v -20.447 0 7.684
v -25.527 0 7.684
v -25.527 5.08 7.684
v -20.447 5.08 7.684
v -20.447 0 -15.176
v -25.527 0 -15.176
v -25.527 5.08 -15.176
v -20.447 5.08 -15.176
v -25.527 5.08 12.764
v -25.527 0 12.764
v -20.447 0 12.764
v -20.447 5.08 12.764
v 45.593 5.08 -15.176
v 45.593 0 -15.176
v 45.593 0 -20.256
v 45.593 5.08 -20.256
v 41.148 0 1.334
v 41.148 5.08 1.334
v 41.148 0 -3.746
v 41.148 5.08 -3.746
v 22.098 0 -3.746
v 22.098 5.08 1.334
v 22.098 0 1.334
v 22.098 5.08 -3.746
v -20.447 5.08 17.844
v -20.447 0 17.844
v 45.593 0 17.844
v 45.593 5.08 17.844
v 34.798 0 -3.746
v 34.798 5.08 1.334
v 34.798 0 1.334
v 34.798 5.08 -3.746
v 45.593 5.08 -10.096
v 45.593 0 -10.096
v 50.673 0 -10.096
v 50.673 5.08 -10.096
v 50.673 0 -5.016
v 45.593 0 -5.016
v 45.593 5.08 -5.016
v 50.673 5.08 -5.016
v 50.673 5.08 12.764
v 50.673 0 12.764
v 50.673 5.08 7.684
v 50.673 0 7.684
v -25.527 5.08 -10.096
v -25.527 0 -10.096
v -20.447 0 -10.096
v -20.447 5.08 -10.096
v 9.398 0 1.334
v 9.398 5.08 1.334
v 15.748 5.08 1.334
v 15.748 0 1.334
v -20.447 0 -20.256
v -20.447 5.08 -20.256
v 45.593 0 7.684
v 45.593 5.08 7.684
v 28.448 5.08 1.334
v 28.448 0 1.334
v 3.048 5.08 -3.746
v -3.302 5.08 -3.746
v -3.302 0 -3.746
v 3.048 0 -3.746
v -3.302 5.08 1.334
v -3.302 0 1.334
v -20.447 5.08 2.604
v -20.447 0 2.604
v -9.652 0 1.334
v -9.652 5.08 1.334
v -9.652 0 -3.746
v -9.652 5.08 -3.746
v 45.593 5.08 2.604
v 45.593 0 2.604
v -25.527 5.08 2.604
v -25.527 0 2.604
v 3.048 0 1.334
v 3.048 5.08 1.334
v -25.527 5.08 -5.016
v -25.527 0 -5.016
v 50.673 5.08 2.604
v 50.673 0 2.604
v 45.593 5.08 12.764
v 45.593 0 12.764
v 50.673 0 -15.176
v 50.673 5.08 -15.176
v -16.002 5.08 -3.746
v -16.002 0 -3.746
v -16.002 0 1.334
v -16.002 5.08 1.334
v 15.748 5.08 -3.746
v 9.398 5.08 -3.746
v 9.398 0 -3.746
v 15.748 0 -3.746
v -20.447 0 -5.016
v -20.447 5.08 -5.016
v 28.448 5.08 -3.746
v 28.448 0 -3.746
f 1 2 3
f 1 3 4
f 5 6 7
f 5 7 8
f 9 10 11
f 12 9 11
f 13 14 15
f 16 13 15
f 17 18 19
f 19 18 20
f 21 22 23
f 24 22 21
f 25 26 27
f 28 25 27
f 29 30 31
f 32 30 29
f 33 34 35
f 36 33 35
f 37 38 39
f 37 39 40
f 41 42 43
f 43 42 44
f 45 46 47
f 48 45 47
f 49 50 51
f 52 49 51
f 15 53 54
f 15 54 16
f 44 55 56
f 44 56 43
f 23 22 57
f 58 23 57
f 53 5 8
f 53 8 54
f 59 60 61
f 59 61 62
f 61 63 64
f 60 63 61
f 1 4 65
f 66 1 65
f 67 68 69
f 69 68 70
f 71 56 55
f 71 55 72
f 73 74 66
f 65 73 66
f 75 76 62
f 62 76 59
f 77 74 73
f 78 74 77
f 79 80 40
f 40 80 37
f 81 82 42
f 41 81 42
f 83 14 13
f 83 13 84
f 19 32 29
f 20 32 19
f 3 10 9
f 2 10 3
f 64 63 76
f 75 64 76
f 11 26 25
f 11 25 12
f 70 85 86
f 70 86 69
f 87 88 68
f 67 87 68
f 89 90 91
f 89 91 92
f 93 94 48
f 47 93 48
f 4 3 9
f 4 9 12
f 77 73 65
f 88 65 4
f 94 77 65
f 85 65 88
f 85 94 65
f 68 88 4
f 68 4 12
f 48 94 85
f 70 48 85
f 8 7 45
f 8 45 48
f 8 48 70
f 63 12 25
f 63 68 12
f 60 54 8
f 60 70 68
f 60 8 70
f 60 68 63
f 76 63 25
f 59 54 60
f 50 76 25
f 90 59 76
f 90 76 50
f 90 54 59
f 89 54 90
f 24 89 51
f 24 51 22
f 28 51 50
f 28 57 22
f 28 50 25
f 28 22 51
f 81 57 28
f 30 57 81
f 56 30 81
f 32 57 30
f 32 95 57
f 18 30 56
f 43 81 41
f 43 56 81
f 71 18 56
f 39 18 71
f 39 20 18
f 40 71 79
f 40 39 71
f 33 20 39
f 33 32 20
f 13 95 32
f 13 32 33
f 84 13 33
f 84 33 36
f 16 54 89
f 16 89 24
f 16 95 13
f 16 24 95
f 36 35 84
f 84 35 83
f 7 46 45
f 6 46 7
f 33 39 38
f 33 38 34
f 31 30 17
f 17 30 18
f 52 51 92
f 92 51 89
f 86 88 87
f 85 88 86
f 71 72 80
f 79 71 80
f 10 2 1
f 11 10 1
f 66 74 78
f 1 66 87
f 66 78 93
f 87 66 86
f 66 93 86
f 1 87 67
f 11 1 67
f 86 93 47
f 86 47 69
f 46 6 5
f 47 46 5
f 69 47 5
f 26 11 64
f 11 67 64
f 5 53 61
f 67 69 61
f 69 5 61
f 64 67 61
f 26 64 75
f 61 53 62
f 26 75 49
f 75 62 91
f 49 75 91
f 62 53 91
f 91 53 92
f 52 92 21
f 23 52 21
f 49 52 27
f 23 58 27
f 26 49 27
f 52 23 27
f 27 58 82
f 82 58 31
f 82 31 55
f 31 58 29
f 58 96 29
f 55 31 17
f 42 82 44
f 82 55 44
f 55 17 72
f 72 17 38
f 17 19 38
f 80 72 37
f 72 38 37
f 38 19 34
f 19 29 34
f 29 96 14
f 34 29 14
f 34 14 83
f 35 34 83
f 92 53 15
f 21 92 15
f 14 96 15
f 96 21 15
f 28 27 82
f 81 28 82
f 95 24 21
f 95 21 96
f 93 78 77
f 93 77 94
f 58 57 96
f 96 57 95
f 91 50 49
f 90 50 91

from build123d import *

# Parameters (mm, degrees)
SKETCH1_W           = 76.2
SKETCH1_H           = 38.1
BOSS_EXTRUDE1_DEPTH = 5.08
SKETCH2_W           = 5.08
SKETCH2_H           = 5.08
CUT_EXTRUDE1_DEPTH  = 5.08
SKETCH3_W           = 6.35
SKETCH3_H           = 5.08
CUT_EXTRUDE2_DEPTH  = 5.08


with BuildPart() as part:
    # Sketch1 → Boss-Extrude1 (new body)
    with BuildSketch(Plane(origin=(0, 0, 0), x_dir=(1, 0, 0), z_dir=(0, 1, 0))):
        with Locations((12.573, 1.2065)):
            Rectangle(SKETCH1_W, SKETCH1_H)
    extrude(amount=BOSS_EXTRUDE1_DEPTH)

    # Sketch2 → Cut-Extrude1 (cut)
    with BuildSketch(Plane(origin=(0, 5.08, 0), x_dir=(1, 0, 0), z_dir=(0, 1, 0))):
        with Locations((-22.987, -5.1435)):
            Rectangle(SKETCH2_W, SKETCH2_H)
        with Locations((48.133, 17.7165)):
            Rectangle(SKETCH2_W, SKETCH2_H)
        with Locations((48.133, 7.5565)):
            Rectangle(SKETCH2_W, SKETCH2_H)
        with Locations((48.133, -15.3035)):
            Rectangle(SKETCH2_W, SKETCH2_H)
        with Locations((48.133, -5.1435)):
            Rectangle(SKETCH2_W, SKETCH2_H)
        with Locations((-22.987, -15.3035)):
            Rectangle(SKETCH2_W, SKETCH2_H)
        with Locations((-22.987, 7.5565)):
            Rectangle(SKETCH2_W, SKETCH2_H)
        with Locations((-22.987, 17.7165)):
            Rectangle(SKETCH2_W, SKETCH2_H)
    extrude(amount=-CUT_EXTRUDE1_DEPTH, mode=Mode.SUBTRACT)

    # Sketch3 → Cut-Extrude2 (cut)
    with BuildSketch(Plane(origin=(0, 5.08, 0), x_dir=(1, 0, 0), z_dir=(0, 1, 0))):
        with Locations((-12.827, 1.2065)):
            Rectangle(SKETCH3_W, SKETCH3_H)
        with Locations((12.573, 1.2065)):
            Rectangle(SKETCH3_W, SKETCH3_H)
        with Locations((25.273, 1.2065)):
            Rectangle(SKETCH3_W, SKETCH3_H)
        with Locations((37.973, 1.2065)):
            Rectangle(SKETCH3_W, SKETCH3_H)
        with Locations((-0.127, 1.2065)):
            Rectangle(SKETCH3_W, SKETCH3_H)
    extrude(amount=-CUT_EXTRUDE2_DEPTH, mode=Mode.SUBTRACT)


solid = part.part
